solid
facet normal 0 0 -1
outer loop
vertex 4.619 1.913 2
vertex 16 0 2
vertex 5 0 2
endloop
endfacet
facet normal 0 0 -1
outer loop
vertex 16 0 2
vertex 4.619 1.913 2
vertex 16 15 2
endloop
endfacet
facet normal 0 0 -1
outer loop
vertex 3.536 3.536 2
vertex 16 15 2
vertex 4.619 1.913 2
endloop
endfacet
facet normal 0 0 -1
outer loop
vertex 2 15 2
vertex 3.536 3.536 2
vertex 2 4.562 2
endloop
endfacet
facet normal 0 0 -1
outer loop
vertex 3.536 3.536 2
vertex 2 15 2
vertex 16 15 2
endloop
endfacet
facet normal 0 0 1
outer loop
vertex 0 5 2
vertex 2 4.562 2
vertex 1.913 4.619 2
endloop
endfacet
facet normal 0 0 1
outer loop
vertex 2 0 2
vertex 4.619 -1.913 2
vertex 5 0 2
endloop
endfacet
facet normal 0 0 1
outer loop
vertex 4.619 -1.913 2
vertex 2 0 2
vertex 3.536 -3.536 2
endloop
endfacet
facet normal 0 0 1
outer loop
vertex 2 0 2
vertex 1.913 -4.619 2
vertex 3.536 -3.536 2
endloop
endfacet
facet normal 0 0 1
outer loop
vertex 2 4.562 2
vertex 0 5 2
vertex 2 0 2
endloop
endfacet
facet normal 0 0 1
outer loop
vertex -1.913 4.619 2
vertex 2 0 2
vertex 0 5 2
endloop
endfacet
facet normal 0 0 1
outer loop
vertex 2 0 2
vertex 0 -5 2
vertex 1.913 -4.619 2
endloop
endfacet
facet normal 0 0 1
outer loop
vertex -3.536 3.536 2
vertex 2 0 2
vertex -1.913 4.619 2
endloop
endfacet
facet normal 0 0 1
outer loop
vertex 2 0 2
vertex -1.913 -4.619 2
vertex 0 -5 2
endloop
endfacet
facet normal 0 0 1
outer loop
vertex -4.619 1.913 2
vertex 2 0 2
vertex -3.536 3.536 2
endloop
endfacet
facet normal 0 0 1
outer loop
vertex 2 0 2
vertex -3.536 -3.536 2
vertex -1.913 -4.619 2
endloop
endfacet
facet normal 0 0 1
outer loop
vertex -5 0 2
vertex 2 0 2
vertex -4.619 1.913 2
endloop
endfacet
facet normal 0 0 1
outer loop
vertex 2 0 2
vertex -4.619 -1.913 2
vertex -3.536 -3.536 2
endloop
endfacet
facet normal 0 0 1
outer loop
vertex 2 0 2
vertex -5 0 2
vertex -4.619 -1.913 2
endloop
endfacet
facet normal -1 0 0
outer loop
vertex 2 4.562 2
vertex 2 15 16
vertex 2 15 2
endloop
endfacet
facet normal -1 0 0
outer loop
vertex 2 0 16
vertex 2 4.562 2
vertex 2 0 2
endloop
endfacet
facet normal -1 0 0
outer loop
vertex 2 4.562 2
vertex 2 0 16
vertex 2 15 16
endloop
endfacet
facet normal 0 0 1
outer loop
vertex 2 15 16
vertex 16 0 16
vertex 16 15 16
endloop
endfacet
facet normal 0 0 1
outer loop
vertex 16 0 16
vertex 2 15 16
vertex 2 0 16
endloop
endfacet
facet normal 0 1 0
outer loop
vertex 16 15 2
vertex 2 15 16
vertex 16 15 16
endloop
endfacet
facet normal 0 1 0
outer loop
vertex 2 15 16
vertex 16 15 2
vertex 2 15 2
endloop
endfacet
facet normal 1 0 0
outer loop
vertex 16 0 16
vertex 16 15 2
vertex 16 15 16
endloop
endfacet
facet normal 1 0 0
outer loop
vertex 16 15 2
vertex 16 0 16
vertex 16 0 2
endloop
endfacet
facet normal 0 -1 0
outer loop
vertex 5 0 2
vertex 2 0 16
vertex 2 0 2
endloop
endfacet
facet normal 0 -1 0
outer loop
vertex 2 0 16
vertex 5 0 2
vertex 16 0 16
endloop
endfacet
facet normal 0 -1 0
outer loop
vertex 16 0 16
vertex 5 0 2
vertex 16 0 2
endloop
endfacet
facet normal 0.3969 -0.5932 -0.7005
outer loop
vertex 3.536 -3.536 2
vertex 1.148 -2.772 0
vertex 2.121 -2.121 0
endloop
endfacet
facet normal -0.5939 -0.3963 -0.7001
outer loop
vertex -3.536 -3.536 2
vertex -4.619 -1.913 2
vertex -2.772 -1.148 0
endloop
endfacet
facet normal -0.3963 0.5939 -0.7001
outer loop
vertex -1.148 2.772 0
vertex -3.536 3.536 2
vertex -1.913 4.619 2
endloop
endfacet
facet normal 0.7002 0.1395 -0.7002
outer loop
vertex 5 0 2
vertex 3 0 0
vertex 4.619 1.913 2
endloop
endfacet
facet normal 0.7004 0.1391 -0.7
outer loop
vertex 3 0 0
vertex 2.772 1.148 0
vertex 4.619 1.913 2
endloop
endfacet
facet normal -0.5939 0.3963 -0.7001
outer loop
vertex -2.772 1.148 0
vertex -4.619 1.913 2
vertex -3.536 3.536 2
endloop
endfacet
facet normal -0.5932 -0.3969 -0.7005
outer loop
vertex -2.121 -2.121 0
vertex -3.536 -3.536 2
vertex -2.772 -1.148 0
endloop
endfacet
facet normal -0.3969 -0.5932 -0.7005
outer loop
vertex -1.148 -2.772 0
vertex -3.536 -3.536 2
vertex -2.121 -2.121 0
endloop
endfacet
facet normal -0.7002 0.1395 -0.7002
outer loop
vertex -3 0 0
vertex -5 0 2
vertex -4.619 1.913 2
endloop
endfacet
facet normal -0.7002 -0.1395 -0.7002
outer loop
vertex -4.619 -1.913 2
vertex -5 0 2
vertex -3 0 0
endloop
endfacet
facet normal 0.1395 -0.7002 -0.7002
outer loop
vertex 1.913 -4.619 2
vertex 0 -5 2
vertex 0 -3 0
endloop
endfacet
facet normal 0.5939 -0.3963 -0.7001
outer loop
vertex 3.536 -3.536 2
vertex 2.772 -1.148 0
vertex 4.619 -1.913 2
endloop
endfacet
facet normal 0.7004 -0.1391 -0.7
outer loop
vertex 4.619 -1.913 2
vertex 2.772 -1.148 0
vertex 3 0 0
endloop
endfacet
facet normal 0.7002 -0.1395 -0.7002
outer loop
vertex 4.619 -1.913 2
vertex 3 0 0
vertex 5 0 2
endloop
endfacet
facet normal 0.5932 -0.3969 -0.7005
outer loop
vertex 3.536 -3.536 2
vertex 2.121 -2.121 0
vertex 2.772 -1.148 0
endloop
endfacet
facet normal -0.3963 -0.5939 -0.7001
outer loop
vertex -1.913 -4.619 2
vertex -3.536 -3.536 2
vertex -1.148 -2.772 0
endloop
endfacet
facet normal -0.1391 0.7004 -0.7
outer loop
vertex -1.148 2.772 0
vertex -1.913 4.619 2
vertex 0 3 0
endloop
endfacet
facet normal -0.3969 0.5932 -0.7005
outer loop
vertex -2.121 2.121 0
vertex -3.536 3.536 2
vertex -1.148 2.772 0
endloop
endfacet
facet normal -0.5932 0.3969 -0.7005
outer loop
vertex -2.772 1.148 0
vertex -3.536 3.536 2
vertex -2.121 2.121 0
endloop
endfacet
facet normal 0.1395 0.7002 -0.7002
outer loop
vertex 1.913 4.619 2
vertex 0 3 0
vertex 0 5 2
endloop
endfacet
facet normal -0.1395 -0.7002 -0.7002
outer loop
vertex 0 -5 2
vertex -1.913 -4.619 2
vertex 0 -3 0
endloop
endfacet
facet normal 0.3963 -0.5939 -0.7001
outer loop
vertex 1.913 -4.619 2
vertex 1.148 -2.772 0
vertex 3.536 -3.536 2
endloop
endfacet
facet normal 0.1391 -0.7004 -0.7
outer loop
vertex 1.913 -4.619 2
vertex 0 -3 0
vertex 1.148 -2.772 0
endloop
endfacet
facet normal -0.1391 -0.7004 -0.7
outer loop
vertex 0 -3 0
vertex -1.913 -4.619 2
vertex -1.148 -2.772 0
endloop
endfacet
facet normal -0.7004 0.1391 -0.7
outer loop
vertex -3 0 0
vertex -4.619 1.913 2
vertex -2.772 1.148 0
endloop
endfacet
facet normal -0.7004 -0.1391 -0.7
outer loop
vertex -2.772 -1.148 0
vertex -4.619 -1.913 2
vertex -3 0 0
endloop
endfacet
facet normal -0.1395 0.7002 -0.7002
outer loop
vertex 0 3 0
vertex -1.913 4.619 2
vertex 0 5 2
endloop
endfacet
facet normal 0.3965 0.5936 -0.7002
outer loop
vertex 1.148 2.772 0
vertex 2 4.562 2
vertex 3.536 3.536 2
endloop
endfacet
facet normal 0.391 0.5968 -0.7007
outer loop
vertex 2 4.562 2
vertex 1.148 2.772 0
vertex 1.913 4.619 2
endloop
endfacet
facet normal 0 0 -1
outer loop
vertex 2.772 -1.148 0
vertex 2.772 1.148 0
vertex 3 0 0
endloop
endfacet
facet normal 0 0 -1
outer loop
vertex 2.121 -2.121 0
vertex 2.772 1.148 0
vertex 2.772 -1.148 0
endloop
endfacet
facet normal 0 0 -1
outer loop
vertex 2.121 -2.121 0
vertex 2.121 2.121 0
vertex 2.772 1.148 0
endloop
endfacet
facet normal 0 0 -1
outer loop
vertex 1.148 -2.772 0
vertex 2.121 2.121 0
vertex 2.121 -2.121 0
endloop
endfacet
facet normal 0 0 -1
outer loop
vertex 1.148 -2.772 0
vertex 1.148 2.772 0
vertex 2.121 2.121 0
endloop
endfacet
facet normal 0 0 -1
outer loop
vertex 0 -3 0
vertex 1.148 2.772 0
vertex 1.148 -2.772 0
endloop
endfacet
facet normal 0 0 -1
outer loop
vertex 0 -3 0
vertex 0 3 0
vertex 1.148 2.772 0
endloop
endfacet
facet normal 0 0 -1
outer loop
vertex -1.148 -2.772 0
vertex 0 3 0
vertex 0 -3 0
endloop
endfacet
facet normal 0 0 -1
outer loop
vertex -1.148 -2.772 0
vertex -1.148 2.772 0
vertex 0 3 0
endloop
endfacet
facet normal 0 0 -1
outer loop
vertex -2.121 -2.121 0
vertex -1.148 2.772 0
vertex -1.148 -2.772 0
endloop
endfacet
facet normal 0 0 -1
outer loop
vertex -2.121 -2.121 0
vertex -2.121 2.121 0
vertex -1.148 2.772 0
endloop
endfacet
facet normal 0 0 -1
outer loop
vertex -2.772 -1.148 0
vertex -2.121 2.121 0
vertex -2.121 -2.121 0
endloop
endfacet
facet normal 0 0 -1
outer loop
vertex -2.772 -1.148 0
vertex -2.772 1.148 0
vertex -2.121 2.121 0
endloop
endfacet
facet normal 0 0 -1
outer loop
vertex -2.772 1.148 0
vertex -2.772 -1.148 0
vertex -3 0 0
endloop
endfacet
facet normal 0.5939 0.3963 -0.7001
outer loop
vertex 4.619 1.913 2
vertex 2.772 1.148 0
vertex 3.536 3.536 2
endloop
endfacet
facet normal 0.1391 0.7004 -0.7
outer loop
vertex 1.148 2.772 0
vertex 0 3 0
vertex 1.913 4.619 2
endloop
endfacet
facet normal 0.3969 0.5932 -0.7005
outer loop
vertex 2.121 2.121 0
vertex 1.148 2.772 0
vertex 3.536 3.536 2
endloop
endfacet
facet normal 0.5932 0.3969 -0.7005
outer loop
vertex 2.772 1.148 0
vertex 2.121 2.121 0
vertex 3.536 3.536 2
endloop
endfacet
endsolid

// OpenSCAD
body_d = 18;
body_h = 18;
body_w = 30;
body_t = 2;

cut_l = 15;

module body(size) {
    linear_extrude(height=size.z)
    square([size.x, size.y]);
}


difference() {
    %body([body_d, body_w, body_h]);
    translate([body_t, 0, body_t])
    body([body_d-2*body_t, cut_l, body_h-2*body_t]);
}


cylinder(h=body_t, r1=3, r2=5);
